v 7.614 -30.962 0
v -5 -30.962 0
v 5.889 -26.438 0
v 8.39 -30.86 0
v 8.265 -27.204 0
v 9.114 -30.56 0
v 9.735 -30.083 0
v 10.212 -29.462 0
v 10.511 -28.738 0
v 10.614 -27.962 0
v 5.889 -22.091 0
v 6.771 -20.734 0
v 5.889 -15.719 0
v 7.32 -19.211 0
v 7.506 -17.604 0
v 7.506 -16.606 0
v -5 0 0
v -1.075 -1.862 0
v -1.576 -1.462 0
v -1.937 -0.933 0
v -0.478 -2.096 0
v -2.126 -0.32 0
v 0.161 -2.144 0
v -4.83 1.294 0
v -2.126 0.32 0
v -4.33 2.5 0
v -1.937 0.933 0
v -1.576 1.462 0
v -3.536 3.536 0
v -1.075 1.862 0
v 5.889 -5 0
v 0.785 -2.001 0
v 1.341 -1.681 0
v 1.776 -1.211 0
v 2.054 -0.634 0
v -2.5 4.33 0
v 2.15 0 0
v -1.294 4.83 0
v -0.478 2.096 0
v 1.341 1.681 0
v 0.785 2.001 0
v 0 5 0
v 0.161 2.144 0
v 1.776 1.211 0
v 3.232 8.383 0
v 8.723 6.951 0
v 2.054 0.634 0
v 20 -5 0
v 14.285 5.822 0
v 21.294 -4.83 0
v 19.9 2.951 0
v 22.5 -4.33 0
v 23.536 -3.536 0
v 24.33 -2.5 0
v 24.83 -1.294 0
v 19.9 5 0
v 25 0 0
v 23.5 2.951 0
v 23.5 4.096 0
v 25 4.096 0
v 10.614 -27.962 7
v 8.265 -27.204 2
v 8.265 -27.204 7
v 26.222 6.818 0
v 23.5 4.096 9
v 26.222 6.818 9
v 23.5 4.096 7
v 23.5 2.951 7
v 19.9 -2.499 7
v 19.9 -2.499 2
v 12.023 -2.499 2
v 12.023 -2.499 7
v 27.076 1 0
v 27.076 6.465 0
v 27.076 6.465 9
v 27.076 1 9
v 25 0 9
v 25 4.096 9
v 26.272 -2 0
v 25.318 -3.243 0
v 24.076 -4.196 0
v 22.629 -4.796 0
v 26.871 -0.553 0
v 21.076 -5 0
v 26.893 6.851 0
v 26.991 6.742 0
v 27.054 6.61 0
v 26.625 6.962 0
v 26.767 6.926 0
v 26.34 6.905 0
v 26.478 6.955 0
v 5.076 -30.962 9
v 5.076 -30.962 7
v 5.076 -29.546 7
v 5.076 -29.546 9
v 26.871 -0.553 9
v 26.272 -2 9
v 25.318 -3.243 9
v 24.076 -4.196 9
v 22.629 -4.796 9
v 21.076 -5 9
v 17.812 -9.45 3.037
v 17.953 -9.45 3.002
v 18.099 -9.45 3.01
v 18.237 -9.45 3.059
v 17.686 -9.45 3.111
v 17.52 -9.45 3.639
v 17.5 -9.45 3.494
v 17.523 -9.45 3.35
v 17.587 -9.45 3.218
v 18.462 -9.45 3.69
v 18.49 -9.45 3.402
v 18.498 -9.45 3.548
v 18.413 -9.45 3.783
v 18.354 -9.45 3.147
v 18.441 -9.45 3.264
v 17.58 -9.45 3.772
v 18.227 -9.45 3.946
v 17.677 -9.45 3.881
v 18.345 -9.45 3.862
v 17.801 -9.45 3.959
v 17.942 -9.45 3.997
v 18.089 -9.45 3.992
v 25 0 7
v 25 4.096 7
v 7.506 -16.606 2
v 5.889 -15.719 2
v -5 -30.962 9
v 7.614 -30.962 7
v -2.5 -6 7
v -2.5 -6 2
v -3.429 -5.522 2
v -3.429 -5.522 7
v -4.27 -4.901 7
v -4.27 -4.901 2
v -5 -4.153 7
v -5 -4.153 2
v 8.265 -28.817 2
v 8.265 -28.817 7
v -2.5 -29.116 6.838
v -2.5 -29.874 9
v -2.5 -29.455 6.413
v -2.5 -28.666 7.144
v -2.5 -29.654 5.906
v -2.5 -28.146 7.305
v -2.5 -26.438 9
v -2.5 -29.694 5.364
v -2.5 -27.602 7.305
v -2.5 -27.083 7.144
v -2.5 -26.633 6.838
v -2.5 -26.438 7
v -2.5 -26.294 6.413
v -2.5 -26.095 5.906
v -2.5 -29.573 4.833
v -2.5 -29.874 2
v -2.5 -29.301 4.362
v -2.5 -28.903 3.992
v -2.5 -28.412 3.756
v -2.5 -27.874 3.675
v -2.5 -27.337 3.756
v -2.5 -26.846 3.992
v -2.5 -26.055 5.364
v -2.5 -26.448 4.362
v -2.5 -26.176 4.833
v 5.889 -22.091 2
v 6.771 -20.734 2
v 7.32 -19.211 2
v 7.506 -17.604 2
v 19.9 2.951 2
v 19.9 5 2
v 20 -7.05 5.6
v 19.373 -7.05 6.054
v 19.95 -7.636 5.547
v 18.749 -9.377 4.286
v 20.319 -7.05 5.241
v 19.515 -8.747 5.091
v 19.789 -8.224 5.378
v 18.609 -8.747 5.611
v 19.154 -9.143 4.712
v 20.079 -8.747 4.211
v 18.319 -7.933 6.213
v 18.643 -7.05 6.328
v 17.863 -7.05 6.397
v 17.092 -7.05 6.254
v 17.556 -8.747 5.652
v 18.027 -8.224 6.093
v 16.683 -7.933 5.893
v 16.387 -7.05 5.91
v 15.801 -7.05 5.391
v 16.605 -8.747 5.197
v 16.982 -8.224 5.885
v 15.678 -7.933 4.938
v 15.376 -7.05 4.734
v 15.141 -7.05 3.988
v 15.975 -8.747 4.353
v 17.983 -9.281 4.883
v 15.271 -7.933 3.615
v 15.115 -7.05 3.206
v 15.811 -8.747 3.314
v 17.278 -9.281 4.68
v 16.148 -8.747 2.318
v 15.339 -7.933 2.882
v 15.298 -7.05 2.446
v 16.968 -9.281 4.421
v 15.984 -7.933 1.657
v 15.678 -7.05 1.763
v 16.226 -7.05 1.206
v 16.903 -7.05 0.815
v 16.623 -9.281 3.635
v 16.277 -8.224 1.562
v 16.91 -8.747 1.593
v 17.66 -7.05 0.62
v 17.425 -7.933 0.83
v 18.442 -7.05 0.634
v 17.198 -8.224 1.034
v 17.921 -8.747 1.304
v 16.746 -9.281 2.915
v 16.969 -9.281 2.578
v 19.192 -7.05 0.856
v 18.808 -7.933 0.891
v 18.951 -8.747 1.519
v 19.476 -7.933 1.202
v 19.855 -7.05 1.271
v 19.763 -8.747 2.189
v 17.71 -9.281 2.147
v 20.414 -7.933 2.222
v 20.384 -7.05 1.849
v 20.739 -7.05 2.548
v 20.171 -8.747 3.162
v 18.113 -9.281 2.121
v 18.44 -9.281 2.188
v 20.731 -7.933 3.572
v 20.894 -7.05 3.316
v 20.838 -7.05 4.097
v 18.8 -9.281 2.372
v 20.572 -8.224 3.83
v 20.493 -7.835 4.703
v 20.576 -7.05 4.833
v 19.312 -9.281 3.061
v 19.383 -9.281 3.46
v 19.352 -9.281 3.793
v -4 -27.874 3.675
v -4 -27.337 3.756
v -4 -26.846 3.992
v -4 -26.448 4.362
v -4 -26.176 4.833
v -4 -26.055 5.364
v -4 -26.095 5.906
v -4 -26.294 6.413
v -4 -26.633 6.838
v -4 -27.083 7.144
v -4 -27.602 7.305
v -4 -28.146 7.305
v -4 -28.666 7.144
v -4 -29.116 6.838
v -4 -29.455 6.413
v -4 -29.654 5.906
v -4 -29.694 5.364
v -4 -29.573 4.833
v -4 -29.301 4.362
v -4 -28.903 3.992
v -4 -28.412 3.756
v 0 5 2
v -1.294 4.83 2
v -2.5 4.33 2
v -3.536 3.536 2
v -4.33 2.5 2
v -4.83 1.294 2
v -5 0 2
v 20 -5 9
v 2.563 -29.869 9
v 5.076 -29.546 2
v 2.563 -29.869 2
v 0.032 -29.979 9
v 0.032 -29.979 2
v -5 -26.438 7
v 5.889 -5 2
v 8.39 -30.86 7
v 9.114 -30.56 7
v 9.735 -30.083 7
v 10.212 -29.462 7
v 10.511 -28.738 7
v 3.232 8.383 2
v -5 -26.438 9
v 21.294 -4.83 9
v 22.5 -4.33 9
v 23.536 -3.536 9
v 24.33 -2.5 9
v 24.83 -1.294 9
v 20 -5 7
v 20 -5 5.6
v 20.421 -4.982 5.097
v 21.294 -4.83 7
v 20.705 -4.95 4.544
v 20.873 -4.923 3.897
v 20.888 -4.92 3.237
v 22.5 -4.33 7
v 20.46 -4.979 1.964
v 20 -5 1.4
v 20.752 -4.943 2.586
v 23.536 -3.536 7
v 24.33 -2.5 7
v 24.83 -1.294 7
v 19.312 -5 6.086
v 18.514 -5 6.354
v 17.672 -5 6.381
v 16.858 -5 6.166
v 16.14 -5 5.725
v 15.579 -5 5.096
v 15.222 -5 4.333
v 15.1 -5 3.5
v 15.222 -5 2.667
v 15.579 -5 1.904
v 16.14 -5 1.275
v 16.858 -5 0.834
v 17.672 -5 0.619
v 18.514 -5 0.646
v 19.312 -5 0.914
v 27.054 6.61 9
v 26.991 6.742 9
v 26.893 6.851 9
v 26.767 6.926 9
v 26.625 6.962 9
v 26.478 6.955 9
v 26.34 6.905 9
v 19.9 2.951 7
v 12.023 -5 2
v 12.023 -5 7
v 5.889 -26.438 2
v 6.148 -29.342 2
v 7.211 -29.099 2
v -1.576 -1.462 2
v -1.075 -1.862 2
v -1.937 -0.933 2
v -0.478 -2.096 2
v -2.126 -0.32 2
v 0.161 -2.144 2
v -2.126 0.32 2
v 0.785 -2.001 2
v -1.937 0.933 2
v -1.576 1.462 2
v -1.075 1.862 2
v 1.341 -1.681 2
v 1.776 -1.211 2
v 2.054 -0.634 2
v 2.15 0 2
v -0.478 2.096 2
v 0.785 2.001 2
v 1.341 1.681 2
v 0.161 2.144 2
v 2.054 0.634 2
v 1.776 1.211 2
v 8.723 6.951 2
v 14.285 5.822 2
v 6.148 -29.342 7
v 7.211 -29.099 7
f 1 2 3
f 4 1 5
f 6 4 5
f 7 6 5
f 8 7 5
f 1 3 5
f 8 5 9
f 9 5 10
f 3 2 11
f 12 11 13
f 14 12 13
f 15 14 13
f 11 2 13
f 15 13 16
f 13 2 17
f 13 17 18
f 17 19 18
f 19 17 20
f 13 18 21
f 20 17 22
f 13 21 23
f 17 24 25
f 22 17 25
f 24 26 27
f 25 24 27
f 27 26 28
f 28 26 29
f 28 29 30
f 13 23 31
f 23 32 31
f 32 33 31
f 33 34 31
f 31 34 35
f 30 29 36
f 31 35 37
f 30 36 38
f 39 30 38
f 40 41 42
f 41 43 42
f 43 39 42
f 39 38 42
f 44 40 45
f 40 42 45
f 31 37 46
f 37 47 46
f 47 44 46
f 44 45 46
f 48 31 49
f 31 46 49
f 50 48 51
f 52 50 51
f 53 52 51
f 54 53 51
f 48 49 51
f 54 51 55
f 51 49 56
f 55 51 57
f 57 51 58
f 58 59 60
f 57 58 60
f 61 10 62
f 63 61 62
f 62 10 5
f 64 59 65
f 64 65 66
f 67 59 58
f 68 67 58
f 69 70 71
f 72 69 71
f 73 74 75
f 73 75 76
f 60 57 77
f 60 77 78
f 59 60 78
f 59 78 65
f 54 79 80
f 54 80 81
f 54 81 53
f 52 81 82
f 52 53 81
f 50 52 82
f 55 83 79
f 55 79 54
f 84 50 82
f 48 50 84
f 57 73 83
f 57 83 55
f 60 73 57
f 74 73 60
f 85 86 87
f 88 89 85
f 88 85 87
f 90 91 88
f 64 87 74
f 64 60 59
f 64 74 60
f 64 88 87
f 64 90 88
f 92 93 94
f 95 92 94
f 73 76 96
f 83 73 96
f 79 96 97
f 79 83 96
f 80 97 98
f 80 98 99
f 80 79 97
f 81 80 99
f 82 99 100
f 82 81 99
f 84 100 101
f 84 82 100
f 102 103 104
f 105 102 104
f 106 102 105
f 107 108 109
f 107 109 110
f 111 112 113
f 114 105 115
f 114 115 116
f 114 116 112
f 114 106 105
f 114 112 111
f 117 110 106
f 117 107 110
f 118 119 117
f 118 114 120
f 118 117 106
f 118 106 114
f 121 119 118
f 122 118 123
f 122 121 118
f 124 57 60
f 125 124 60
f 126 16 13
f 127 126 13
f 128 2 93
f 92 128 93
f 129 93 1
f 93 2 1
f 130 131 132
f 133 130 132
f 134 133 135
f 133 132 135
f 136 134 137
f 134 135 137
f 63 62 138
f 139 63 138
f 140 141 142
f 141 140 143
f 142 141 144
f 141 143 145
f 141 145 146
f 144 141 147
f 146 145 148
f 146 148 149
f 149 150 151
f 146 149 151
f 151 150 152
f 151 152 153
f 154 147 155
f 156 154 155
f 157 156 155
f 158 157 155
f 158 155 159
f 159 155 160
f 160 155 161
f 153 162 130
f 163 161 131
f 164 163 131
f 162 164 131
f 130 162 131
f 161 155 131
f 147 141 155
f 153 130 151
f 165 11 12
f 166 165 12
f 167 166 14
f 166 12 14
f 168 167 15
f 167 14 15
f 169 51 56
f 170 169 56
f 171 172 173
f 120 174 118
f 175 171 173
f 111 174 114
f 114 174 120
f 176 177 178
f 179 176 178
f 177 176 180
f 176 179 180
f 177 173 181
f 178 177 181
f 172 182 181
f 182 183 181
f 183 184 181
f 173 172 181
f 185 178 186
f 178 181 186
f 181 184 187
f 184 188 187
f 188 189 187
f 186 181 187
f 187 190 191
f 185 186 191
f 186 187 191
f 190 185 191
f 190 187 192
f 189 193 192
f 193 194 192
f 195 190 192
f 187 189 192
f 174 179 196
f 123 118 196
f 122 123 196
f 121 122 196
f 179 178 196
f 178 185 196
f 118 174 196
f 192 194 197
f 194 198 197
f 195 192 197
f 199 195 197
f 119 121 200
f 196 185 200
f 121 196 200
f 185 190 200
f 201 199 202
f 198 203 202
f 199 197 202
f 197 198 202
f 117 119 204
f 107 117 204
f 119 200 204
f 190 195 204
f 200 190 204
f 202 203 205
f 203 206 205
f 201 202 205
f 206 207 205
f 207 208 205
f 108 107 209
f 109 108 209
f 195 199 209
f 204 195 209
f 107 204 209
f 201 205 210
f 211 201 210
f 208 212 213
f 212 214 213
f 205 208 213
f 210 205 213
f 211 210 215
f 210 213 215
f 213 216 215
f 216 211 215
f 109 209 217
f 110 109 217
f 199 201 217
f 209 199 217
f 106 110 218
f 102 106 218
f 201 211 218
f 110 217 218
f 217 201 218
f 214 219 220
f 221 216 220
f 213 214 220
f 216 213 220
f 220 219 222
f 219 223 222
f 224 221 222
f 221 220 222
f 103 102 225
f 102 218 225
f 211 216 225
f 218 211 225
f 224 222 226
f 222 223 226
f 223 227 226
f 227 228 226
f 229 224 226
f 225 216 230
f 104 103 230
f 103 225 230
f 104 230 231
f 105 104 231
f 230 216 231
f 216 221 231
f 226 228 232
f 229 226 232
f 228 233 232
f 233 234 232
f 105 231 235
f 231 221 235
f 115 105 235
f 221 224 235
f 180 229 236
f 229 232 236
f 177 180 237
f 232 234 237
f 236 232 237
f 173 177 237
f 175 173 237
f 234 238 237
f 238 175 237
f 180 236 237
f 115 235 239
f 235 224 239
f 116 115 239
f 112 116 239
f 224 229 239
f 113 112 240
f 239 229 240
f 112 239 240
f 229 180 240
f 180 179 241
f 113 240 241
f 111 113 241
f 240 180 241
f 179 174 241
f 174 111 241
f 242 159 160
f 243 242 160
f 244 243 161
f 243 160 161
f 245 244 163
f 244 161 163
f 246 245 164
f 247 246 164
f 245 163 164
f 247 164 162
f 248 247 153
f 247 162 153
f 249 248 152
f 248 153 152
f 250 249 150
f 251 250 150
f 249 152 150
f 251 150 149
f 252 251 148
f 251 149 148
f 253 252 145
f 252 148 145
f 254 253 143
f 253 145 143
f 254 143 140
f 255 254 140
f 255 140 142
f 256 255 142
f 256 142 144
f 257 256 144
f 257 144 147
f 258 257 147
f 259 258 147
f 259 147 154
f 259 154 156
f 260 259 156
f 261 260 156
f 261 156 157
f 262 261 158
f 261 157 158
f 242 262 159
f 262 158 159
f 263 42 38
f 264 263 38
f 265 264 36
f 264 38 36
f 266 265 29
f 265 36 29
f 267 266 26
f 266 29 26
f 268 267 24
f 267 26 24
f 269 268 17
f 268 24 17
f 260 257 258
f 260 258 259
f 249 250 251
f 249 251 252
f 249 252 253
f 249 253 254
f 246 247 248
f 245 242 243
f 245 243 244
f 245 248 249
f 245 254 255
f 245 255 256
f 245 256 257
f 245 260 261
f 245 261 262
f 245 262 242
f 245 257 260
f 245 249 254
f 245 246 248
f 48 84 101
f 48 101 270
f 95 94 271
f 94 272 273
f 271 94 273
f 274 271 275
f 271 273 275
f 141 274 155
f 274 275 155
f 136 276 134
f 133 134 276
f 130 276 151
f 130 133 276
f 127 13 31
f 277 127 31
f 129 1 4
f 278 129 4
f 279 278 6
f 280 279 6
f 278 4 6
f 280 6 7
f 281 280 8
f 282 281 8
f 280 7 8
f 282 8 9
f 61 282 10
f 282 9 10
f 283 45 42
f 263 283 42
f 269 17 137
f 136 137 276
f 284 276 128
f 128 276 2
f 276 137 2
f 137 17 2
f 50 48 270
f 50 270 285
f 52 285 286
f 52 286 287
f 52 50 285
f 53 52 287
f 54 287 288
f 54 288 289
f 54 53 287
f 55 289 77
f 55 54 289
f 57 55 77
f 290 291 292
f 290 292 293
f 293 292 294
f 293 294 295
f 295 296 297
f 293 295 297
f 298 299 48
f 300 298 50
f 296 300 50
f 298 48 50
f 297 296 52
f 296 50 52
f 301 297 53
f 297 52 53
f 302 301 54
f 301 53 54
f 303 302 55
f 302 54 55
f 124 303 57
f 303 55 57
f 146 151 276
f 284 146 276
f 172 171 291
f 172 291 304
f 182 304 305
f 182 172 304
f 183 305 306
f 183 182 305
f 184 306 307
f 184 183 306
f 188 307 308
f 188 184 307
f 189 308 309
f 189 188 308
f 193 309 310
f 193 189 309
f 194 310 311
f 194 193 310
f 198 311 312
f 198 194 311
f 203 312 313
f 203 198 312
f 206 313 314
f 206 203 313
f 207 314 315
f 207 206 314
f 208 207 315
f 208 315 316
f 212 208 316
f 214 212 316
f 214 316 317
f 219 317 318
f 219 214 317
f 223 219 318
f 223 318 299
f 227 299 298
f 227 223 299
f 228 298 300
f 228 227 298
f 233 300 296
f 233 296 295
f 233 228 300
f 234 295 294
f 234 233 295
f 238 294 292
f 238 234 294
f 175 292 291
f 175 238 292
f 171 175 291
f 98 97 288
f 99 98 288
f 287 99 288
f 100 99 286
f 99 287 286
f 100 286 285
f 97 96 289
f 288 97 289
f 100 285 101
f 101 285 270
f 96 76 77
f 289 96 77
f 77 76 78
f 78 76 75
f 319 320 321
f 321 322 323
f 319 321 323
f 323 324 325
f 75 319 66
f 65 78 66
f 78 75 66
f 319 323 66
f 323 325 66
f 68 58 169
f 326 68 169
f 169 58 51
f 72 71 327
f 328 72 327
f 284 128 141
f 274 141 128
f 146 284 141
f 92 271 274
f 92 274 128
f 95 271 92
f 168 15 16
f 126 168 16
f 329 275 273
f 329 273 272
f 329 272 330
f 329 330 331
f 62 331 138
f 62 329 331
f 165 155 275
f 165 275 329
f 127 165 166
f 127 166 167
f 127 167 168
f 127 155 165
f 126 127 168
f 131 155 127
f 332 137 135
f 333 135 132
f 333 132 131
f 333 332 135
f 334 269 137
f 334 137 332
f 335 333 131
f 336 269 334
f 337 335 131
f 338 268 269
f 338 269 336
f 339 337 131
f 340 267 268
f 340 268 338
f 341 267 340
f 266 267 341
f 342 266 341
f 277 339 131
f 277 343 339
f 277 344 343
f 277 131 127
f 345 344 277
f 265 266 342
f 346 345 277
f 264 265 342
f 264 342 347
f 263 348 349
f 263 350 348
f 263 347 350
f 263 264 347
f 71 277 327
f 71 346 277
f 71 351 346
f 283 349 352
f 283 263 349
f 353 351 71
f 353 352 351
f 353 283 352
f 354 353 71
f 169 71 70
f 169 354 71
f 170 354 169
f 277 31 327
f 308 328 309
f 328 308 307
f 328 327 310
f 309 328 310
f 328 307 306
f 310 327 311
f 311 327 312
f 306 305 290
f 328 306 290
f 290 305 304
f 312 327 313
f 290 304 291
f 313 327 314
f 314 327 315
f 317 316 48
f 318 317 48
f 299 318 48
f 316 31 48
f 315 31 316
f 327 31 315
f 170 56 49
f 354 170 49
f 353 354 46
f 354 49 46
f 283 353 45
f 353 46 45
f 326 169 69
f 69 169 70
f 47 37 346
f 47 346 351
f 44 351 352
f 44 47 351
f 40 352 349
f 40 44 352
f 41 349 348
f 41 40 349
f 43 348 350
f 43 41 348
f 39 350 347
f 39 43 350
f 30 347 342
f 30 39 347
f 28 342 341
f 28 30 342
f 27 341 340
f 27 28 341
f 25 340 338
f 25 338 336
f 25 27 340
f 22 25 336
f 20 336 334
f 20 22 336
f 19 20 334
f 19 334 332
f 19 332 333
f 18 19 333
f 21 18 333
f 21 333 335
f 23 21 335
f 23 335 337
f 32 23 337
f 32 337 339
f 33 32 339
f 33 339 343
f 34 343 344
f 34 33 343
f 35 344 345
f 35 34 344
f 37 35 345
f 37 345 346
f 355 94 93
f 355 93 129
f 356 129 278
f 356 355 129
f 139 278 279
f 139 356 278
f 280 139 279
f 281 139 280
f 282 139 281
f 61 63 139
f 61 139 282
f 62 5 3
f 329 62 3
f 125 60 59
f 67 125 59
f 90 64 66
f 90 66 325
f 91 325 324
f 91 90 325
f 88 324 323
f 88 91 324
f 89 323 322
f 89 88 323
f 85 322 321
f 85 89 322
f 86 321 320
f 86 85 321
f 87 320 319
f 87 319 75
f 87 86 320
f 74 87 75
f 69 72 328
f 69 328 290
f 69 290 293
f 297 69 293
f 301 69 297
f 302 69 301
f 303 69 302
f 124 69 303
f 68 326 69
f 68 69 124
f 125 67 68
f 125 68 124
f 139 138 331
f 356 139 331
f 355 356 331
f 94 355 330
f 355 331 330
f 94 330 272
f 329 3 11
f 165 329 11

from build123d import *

# Parameters (mm, degrees)
EXTRUDE_3_DEPTH     = 9
EXTRUDE_3_2_DEPTH   = 9
EXTRUDE_4_DEPTH     = 7
SKETCH_1_8_R        = 2.15
EXTRUDE_5_DEPTH     = 2
SKETCH_2_R          = 2.9
EXTRUDE_6_DEPTH     = 2.45
SKETCH_4_R          = 2.9
EXTRUDE_7_DEPTH     = 2
FILLET_2_R          = 2.4
SKETCH_5_R          = 1.825
CUT_EXTRUDE_1_DEPTH = 1.5


with BuildPart() as part:
    # 스케치1 → 보스-돌출3 (new body)
    with BuildSketch(Plane.XY):
        with BuildLine():
            Line((-2.5, -26.437677825), (-5, -26.437677825))
            Line((-5, -26.437677825), (-5, -30.96175738))
            Line((-5, -30.96175738), (5.076141326, -30.96175738))
            Line((5.076141326, -30.96175738), (5.076141326, -29.54601506))
            ThreePointArc((5.076141326, -29.54601506), (1.298498135, -29.950761581), (-2.5, -29.874474333))
            Line((-2.5, -29.874474333), (-2.5, -26.437677825))
        make_face()
    extrude(amount=EXTRUDE_3_DEPTH)

    # 스케치1<7> → 보스-돌출4 (add)
    with BuildSketch(Plane.XY):
        with BuildLine():
            Line((23.5, 2.950728465), (19.9, 2.950728465))
            Line((19.9, 2.950728465), (19.9, -2.499271535))
            Line((19.9, -2.499271535), (12.023157318, -2.499271535))
            Line((12.023157318, -2.499271535), (12.023157318, -5))
            Line((12.023157318, -5), (20, -5))
            ThreePointArc((20, -5), (23.535533906, -3.535533906), (25, 0))
            Line((25, 0), (25, 4.09591659))
            Line((25, 4.09591659), (23.5, 4.09591659))
            Line((23.5, 4.09591659), (23.5, 2.950728465))
        make_face()
        with BuildLine():
            ThreePointArc((-2.5, -6), (-3.862002616, -5.228282299), (-5, -4.153311931))
            Line((-5, -4.153311931), (-5, -26.437677825))
            Line((-5, -26.437677825), (-2.5, -26.437677825))
            Line((-2.5, -26.437677825), (-2.5, -6))
        make_face()
        with BuildLine():
            Line((5.076141326, -29.54601506), (5.076141326, -30.96175738))
            Line((5.076141326, -30.96175738), (7.613716386, -30.96175738))
            ThreePointArc((7.613716386, -30.96175738), (9.735036729, -30.083077723), (10.613716386, -27.96175738))
            Line((10.613716386, -27.96175738), (8.264928228, -27.20398111))
            Line((8.264928228, -27.20398111), (8.264928228, -28.81709871))
            ThreePointArc((8.264928228, -28.81709871), (6.680483813, -29.225080884), (5.076141326, -29.54601506))
        make_face()
    extrude(amount=EXTRUDE_4_DEPTH)


with BuildPart() as body_2:
    # 스케치1 → Extrude 3 2 (new body)
    with BuildSketch(Plane.XY):
        with BuildLine():
            Line((26.22215467, 6.81807126), (23.5, 4.09591659))
            Line((23.5, 4.09591659), (25, 4.09591659))
            Line((25, 4.09591659), (25, 0))
            ThreePointArc((25, 0), (23.535533906, -3.535533906), (20, -5))
            Line((20, -5), (21.075708061, -5))
            ThreePointArc((21.075708061, -5), (25.318348748, -3.242640687), (27.075708061, 1))
            Line((27.075708061, 1), (27.075708061, 6.46451787))
            ThreePointArc((27.075708061, 6.46451787), (26.767049777, 6.926457636), (26.22215467, 6.81807126))
        make_face()
    extrude(amount=EXTRUDE_3_2_DEPTH)


with BuildPart() as extrude_4_piece_1:
    # of the separate pieces the step leaves, piece 1, a body of its own (extrude_4_pieces)
    add(part.part.solids().sort_by_distance((-2.5, -29.874474333, 0))[0])



with BuildPart() as extrude_4_piece_2:
    # of the separate pieces the step leaves, piece 2, a body of its own (extrude_4_pieces)
    add(part.part.solids().sort_by_distance((23.5, 2.950728465, 0))[0])


with BuildPart() as extrude_4_piece_1_1:
    add(extrude_4_piece_1.part)

    add(extrude_4_piece_2.part)  # 보스-돌출5 merges 보스-돌출4 piece 2
    # 스케치1<8> → 보스-돌출5 (add)
    with BuildSketch(Plane.XY):
        with BuildLine():
            Line((3.231912185, 8.38327913), (0, 5))
            ThreePointArc((0, 5), (-3.535533906, 3.535533906), (-5, 0))
            Line((-5, 0), (-5, -4.153311931))
            ThreePointArc((-5, -4.153311931), (-3.862002616, -5.228282299), (-2.5, -6))
            Line((-2.5, -6), (-2.5, -29.874474333))
            ThreePointArc((-2.5, -29.874474333), (2.93054776, -29.83531643), (8.264928228, -28.81709871))
            Line((8.264928228, -28.81709871), (8.264928228, -27.20398111))
            Line((8.264928228, -27.20398111), (5.889404941, -26.437579436))
            Line((5.889404941, -26.437579436), (5.889404941, -22.090836604))
            ThreePointArc((5.889404941, -22.090836604), (7.089676261, -19.98856225), (7.506209453, -17.603880133))
            Line((7.506209453, -17.603880133), (7.506209453, -16.606122356))
            Line((7.506209453, -16.606122356), (5.889404941, -15.718789718))
            Line((5.889404941, -15.718789718), (5.889404941, -5))
            Line((5.889404941, -5), (12.023157318, -5))
            Line((12.023157318, -5), (12.023157318, -2.499271535))
            Line((12.023157318, -2.499271535), (19.9, -2.499271535))
            Line((19.9, -2.499271535), (19.9, 5))
            ThreePointArc((19.9, 5), (11.496170313, 6.34783243), (3.231912185, 8.38327913))
        make_face()
        Circle(SKETCH_1_8_R, mode=Mode.SUBTRACT)
    extrude(amount=EXTRUDE_5_DEPTH)

    # 스케치2 → 보스-돌출6 (add, symmetric)
    with BuildSketch(Plane.XZ.offset(5)):
        with Locations((18, 3.5)):
            Circle(SKETCH_2_R)
    extrude(amount=EXTRUDE_6_DEPTH, both=True)

    # 스케치4 → 보스-돌출7 (add)
    with BuildSketch(Plane.XZ.offset(7.45)):
        with Locations((18, 3.5)):
            Circle(SKETCH_4_R)
    extrude(amount=EXTRUDE_7_DEPTH)

    # 필렛2
    fillet_2_edges = [extrude_4_piece_1_1.edges().sort_by_distance(p)[0] for p in [
        (15.1, -9.45, 3.5),
    ]]
    fillet(fillet_2_edges, radius=FILLET_2_R)

    # 스케치5 → 컷-돌출1 (cut)
    with BuildSketch(Plane(origin=(-2.5, 0, 0), x_dir=(0, 0, -1), z_dir=(1, 0, 0))):
        with Locations((-5.5, -27.874474333)):
            Circle(SKETCH_5_R)
    extrude(amount=-CUT_EXTRUDE_1_DEPTH, mode=Mode.SUBTRACT)


solid = Compound([body_2.part, extrude_4_piece_1_1.part])
